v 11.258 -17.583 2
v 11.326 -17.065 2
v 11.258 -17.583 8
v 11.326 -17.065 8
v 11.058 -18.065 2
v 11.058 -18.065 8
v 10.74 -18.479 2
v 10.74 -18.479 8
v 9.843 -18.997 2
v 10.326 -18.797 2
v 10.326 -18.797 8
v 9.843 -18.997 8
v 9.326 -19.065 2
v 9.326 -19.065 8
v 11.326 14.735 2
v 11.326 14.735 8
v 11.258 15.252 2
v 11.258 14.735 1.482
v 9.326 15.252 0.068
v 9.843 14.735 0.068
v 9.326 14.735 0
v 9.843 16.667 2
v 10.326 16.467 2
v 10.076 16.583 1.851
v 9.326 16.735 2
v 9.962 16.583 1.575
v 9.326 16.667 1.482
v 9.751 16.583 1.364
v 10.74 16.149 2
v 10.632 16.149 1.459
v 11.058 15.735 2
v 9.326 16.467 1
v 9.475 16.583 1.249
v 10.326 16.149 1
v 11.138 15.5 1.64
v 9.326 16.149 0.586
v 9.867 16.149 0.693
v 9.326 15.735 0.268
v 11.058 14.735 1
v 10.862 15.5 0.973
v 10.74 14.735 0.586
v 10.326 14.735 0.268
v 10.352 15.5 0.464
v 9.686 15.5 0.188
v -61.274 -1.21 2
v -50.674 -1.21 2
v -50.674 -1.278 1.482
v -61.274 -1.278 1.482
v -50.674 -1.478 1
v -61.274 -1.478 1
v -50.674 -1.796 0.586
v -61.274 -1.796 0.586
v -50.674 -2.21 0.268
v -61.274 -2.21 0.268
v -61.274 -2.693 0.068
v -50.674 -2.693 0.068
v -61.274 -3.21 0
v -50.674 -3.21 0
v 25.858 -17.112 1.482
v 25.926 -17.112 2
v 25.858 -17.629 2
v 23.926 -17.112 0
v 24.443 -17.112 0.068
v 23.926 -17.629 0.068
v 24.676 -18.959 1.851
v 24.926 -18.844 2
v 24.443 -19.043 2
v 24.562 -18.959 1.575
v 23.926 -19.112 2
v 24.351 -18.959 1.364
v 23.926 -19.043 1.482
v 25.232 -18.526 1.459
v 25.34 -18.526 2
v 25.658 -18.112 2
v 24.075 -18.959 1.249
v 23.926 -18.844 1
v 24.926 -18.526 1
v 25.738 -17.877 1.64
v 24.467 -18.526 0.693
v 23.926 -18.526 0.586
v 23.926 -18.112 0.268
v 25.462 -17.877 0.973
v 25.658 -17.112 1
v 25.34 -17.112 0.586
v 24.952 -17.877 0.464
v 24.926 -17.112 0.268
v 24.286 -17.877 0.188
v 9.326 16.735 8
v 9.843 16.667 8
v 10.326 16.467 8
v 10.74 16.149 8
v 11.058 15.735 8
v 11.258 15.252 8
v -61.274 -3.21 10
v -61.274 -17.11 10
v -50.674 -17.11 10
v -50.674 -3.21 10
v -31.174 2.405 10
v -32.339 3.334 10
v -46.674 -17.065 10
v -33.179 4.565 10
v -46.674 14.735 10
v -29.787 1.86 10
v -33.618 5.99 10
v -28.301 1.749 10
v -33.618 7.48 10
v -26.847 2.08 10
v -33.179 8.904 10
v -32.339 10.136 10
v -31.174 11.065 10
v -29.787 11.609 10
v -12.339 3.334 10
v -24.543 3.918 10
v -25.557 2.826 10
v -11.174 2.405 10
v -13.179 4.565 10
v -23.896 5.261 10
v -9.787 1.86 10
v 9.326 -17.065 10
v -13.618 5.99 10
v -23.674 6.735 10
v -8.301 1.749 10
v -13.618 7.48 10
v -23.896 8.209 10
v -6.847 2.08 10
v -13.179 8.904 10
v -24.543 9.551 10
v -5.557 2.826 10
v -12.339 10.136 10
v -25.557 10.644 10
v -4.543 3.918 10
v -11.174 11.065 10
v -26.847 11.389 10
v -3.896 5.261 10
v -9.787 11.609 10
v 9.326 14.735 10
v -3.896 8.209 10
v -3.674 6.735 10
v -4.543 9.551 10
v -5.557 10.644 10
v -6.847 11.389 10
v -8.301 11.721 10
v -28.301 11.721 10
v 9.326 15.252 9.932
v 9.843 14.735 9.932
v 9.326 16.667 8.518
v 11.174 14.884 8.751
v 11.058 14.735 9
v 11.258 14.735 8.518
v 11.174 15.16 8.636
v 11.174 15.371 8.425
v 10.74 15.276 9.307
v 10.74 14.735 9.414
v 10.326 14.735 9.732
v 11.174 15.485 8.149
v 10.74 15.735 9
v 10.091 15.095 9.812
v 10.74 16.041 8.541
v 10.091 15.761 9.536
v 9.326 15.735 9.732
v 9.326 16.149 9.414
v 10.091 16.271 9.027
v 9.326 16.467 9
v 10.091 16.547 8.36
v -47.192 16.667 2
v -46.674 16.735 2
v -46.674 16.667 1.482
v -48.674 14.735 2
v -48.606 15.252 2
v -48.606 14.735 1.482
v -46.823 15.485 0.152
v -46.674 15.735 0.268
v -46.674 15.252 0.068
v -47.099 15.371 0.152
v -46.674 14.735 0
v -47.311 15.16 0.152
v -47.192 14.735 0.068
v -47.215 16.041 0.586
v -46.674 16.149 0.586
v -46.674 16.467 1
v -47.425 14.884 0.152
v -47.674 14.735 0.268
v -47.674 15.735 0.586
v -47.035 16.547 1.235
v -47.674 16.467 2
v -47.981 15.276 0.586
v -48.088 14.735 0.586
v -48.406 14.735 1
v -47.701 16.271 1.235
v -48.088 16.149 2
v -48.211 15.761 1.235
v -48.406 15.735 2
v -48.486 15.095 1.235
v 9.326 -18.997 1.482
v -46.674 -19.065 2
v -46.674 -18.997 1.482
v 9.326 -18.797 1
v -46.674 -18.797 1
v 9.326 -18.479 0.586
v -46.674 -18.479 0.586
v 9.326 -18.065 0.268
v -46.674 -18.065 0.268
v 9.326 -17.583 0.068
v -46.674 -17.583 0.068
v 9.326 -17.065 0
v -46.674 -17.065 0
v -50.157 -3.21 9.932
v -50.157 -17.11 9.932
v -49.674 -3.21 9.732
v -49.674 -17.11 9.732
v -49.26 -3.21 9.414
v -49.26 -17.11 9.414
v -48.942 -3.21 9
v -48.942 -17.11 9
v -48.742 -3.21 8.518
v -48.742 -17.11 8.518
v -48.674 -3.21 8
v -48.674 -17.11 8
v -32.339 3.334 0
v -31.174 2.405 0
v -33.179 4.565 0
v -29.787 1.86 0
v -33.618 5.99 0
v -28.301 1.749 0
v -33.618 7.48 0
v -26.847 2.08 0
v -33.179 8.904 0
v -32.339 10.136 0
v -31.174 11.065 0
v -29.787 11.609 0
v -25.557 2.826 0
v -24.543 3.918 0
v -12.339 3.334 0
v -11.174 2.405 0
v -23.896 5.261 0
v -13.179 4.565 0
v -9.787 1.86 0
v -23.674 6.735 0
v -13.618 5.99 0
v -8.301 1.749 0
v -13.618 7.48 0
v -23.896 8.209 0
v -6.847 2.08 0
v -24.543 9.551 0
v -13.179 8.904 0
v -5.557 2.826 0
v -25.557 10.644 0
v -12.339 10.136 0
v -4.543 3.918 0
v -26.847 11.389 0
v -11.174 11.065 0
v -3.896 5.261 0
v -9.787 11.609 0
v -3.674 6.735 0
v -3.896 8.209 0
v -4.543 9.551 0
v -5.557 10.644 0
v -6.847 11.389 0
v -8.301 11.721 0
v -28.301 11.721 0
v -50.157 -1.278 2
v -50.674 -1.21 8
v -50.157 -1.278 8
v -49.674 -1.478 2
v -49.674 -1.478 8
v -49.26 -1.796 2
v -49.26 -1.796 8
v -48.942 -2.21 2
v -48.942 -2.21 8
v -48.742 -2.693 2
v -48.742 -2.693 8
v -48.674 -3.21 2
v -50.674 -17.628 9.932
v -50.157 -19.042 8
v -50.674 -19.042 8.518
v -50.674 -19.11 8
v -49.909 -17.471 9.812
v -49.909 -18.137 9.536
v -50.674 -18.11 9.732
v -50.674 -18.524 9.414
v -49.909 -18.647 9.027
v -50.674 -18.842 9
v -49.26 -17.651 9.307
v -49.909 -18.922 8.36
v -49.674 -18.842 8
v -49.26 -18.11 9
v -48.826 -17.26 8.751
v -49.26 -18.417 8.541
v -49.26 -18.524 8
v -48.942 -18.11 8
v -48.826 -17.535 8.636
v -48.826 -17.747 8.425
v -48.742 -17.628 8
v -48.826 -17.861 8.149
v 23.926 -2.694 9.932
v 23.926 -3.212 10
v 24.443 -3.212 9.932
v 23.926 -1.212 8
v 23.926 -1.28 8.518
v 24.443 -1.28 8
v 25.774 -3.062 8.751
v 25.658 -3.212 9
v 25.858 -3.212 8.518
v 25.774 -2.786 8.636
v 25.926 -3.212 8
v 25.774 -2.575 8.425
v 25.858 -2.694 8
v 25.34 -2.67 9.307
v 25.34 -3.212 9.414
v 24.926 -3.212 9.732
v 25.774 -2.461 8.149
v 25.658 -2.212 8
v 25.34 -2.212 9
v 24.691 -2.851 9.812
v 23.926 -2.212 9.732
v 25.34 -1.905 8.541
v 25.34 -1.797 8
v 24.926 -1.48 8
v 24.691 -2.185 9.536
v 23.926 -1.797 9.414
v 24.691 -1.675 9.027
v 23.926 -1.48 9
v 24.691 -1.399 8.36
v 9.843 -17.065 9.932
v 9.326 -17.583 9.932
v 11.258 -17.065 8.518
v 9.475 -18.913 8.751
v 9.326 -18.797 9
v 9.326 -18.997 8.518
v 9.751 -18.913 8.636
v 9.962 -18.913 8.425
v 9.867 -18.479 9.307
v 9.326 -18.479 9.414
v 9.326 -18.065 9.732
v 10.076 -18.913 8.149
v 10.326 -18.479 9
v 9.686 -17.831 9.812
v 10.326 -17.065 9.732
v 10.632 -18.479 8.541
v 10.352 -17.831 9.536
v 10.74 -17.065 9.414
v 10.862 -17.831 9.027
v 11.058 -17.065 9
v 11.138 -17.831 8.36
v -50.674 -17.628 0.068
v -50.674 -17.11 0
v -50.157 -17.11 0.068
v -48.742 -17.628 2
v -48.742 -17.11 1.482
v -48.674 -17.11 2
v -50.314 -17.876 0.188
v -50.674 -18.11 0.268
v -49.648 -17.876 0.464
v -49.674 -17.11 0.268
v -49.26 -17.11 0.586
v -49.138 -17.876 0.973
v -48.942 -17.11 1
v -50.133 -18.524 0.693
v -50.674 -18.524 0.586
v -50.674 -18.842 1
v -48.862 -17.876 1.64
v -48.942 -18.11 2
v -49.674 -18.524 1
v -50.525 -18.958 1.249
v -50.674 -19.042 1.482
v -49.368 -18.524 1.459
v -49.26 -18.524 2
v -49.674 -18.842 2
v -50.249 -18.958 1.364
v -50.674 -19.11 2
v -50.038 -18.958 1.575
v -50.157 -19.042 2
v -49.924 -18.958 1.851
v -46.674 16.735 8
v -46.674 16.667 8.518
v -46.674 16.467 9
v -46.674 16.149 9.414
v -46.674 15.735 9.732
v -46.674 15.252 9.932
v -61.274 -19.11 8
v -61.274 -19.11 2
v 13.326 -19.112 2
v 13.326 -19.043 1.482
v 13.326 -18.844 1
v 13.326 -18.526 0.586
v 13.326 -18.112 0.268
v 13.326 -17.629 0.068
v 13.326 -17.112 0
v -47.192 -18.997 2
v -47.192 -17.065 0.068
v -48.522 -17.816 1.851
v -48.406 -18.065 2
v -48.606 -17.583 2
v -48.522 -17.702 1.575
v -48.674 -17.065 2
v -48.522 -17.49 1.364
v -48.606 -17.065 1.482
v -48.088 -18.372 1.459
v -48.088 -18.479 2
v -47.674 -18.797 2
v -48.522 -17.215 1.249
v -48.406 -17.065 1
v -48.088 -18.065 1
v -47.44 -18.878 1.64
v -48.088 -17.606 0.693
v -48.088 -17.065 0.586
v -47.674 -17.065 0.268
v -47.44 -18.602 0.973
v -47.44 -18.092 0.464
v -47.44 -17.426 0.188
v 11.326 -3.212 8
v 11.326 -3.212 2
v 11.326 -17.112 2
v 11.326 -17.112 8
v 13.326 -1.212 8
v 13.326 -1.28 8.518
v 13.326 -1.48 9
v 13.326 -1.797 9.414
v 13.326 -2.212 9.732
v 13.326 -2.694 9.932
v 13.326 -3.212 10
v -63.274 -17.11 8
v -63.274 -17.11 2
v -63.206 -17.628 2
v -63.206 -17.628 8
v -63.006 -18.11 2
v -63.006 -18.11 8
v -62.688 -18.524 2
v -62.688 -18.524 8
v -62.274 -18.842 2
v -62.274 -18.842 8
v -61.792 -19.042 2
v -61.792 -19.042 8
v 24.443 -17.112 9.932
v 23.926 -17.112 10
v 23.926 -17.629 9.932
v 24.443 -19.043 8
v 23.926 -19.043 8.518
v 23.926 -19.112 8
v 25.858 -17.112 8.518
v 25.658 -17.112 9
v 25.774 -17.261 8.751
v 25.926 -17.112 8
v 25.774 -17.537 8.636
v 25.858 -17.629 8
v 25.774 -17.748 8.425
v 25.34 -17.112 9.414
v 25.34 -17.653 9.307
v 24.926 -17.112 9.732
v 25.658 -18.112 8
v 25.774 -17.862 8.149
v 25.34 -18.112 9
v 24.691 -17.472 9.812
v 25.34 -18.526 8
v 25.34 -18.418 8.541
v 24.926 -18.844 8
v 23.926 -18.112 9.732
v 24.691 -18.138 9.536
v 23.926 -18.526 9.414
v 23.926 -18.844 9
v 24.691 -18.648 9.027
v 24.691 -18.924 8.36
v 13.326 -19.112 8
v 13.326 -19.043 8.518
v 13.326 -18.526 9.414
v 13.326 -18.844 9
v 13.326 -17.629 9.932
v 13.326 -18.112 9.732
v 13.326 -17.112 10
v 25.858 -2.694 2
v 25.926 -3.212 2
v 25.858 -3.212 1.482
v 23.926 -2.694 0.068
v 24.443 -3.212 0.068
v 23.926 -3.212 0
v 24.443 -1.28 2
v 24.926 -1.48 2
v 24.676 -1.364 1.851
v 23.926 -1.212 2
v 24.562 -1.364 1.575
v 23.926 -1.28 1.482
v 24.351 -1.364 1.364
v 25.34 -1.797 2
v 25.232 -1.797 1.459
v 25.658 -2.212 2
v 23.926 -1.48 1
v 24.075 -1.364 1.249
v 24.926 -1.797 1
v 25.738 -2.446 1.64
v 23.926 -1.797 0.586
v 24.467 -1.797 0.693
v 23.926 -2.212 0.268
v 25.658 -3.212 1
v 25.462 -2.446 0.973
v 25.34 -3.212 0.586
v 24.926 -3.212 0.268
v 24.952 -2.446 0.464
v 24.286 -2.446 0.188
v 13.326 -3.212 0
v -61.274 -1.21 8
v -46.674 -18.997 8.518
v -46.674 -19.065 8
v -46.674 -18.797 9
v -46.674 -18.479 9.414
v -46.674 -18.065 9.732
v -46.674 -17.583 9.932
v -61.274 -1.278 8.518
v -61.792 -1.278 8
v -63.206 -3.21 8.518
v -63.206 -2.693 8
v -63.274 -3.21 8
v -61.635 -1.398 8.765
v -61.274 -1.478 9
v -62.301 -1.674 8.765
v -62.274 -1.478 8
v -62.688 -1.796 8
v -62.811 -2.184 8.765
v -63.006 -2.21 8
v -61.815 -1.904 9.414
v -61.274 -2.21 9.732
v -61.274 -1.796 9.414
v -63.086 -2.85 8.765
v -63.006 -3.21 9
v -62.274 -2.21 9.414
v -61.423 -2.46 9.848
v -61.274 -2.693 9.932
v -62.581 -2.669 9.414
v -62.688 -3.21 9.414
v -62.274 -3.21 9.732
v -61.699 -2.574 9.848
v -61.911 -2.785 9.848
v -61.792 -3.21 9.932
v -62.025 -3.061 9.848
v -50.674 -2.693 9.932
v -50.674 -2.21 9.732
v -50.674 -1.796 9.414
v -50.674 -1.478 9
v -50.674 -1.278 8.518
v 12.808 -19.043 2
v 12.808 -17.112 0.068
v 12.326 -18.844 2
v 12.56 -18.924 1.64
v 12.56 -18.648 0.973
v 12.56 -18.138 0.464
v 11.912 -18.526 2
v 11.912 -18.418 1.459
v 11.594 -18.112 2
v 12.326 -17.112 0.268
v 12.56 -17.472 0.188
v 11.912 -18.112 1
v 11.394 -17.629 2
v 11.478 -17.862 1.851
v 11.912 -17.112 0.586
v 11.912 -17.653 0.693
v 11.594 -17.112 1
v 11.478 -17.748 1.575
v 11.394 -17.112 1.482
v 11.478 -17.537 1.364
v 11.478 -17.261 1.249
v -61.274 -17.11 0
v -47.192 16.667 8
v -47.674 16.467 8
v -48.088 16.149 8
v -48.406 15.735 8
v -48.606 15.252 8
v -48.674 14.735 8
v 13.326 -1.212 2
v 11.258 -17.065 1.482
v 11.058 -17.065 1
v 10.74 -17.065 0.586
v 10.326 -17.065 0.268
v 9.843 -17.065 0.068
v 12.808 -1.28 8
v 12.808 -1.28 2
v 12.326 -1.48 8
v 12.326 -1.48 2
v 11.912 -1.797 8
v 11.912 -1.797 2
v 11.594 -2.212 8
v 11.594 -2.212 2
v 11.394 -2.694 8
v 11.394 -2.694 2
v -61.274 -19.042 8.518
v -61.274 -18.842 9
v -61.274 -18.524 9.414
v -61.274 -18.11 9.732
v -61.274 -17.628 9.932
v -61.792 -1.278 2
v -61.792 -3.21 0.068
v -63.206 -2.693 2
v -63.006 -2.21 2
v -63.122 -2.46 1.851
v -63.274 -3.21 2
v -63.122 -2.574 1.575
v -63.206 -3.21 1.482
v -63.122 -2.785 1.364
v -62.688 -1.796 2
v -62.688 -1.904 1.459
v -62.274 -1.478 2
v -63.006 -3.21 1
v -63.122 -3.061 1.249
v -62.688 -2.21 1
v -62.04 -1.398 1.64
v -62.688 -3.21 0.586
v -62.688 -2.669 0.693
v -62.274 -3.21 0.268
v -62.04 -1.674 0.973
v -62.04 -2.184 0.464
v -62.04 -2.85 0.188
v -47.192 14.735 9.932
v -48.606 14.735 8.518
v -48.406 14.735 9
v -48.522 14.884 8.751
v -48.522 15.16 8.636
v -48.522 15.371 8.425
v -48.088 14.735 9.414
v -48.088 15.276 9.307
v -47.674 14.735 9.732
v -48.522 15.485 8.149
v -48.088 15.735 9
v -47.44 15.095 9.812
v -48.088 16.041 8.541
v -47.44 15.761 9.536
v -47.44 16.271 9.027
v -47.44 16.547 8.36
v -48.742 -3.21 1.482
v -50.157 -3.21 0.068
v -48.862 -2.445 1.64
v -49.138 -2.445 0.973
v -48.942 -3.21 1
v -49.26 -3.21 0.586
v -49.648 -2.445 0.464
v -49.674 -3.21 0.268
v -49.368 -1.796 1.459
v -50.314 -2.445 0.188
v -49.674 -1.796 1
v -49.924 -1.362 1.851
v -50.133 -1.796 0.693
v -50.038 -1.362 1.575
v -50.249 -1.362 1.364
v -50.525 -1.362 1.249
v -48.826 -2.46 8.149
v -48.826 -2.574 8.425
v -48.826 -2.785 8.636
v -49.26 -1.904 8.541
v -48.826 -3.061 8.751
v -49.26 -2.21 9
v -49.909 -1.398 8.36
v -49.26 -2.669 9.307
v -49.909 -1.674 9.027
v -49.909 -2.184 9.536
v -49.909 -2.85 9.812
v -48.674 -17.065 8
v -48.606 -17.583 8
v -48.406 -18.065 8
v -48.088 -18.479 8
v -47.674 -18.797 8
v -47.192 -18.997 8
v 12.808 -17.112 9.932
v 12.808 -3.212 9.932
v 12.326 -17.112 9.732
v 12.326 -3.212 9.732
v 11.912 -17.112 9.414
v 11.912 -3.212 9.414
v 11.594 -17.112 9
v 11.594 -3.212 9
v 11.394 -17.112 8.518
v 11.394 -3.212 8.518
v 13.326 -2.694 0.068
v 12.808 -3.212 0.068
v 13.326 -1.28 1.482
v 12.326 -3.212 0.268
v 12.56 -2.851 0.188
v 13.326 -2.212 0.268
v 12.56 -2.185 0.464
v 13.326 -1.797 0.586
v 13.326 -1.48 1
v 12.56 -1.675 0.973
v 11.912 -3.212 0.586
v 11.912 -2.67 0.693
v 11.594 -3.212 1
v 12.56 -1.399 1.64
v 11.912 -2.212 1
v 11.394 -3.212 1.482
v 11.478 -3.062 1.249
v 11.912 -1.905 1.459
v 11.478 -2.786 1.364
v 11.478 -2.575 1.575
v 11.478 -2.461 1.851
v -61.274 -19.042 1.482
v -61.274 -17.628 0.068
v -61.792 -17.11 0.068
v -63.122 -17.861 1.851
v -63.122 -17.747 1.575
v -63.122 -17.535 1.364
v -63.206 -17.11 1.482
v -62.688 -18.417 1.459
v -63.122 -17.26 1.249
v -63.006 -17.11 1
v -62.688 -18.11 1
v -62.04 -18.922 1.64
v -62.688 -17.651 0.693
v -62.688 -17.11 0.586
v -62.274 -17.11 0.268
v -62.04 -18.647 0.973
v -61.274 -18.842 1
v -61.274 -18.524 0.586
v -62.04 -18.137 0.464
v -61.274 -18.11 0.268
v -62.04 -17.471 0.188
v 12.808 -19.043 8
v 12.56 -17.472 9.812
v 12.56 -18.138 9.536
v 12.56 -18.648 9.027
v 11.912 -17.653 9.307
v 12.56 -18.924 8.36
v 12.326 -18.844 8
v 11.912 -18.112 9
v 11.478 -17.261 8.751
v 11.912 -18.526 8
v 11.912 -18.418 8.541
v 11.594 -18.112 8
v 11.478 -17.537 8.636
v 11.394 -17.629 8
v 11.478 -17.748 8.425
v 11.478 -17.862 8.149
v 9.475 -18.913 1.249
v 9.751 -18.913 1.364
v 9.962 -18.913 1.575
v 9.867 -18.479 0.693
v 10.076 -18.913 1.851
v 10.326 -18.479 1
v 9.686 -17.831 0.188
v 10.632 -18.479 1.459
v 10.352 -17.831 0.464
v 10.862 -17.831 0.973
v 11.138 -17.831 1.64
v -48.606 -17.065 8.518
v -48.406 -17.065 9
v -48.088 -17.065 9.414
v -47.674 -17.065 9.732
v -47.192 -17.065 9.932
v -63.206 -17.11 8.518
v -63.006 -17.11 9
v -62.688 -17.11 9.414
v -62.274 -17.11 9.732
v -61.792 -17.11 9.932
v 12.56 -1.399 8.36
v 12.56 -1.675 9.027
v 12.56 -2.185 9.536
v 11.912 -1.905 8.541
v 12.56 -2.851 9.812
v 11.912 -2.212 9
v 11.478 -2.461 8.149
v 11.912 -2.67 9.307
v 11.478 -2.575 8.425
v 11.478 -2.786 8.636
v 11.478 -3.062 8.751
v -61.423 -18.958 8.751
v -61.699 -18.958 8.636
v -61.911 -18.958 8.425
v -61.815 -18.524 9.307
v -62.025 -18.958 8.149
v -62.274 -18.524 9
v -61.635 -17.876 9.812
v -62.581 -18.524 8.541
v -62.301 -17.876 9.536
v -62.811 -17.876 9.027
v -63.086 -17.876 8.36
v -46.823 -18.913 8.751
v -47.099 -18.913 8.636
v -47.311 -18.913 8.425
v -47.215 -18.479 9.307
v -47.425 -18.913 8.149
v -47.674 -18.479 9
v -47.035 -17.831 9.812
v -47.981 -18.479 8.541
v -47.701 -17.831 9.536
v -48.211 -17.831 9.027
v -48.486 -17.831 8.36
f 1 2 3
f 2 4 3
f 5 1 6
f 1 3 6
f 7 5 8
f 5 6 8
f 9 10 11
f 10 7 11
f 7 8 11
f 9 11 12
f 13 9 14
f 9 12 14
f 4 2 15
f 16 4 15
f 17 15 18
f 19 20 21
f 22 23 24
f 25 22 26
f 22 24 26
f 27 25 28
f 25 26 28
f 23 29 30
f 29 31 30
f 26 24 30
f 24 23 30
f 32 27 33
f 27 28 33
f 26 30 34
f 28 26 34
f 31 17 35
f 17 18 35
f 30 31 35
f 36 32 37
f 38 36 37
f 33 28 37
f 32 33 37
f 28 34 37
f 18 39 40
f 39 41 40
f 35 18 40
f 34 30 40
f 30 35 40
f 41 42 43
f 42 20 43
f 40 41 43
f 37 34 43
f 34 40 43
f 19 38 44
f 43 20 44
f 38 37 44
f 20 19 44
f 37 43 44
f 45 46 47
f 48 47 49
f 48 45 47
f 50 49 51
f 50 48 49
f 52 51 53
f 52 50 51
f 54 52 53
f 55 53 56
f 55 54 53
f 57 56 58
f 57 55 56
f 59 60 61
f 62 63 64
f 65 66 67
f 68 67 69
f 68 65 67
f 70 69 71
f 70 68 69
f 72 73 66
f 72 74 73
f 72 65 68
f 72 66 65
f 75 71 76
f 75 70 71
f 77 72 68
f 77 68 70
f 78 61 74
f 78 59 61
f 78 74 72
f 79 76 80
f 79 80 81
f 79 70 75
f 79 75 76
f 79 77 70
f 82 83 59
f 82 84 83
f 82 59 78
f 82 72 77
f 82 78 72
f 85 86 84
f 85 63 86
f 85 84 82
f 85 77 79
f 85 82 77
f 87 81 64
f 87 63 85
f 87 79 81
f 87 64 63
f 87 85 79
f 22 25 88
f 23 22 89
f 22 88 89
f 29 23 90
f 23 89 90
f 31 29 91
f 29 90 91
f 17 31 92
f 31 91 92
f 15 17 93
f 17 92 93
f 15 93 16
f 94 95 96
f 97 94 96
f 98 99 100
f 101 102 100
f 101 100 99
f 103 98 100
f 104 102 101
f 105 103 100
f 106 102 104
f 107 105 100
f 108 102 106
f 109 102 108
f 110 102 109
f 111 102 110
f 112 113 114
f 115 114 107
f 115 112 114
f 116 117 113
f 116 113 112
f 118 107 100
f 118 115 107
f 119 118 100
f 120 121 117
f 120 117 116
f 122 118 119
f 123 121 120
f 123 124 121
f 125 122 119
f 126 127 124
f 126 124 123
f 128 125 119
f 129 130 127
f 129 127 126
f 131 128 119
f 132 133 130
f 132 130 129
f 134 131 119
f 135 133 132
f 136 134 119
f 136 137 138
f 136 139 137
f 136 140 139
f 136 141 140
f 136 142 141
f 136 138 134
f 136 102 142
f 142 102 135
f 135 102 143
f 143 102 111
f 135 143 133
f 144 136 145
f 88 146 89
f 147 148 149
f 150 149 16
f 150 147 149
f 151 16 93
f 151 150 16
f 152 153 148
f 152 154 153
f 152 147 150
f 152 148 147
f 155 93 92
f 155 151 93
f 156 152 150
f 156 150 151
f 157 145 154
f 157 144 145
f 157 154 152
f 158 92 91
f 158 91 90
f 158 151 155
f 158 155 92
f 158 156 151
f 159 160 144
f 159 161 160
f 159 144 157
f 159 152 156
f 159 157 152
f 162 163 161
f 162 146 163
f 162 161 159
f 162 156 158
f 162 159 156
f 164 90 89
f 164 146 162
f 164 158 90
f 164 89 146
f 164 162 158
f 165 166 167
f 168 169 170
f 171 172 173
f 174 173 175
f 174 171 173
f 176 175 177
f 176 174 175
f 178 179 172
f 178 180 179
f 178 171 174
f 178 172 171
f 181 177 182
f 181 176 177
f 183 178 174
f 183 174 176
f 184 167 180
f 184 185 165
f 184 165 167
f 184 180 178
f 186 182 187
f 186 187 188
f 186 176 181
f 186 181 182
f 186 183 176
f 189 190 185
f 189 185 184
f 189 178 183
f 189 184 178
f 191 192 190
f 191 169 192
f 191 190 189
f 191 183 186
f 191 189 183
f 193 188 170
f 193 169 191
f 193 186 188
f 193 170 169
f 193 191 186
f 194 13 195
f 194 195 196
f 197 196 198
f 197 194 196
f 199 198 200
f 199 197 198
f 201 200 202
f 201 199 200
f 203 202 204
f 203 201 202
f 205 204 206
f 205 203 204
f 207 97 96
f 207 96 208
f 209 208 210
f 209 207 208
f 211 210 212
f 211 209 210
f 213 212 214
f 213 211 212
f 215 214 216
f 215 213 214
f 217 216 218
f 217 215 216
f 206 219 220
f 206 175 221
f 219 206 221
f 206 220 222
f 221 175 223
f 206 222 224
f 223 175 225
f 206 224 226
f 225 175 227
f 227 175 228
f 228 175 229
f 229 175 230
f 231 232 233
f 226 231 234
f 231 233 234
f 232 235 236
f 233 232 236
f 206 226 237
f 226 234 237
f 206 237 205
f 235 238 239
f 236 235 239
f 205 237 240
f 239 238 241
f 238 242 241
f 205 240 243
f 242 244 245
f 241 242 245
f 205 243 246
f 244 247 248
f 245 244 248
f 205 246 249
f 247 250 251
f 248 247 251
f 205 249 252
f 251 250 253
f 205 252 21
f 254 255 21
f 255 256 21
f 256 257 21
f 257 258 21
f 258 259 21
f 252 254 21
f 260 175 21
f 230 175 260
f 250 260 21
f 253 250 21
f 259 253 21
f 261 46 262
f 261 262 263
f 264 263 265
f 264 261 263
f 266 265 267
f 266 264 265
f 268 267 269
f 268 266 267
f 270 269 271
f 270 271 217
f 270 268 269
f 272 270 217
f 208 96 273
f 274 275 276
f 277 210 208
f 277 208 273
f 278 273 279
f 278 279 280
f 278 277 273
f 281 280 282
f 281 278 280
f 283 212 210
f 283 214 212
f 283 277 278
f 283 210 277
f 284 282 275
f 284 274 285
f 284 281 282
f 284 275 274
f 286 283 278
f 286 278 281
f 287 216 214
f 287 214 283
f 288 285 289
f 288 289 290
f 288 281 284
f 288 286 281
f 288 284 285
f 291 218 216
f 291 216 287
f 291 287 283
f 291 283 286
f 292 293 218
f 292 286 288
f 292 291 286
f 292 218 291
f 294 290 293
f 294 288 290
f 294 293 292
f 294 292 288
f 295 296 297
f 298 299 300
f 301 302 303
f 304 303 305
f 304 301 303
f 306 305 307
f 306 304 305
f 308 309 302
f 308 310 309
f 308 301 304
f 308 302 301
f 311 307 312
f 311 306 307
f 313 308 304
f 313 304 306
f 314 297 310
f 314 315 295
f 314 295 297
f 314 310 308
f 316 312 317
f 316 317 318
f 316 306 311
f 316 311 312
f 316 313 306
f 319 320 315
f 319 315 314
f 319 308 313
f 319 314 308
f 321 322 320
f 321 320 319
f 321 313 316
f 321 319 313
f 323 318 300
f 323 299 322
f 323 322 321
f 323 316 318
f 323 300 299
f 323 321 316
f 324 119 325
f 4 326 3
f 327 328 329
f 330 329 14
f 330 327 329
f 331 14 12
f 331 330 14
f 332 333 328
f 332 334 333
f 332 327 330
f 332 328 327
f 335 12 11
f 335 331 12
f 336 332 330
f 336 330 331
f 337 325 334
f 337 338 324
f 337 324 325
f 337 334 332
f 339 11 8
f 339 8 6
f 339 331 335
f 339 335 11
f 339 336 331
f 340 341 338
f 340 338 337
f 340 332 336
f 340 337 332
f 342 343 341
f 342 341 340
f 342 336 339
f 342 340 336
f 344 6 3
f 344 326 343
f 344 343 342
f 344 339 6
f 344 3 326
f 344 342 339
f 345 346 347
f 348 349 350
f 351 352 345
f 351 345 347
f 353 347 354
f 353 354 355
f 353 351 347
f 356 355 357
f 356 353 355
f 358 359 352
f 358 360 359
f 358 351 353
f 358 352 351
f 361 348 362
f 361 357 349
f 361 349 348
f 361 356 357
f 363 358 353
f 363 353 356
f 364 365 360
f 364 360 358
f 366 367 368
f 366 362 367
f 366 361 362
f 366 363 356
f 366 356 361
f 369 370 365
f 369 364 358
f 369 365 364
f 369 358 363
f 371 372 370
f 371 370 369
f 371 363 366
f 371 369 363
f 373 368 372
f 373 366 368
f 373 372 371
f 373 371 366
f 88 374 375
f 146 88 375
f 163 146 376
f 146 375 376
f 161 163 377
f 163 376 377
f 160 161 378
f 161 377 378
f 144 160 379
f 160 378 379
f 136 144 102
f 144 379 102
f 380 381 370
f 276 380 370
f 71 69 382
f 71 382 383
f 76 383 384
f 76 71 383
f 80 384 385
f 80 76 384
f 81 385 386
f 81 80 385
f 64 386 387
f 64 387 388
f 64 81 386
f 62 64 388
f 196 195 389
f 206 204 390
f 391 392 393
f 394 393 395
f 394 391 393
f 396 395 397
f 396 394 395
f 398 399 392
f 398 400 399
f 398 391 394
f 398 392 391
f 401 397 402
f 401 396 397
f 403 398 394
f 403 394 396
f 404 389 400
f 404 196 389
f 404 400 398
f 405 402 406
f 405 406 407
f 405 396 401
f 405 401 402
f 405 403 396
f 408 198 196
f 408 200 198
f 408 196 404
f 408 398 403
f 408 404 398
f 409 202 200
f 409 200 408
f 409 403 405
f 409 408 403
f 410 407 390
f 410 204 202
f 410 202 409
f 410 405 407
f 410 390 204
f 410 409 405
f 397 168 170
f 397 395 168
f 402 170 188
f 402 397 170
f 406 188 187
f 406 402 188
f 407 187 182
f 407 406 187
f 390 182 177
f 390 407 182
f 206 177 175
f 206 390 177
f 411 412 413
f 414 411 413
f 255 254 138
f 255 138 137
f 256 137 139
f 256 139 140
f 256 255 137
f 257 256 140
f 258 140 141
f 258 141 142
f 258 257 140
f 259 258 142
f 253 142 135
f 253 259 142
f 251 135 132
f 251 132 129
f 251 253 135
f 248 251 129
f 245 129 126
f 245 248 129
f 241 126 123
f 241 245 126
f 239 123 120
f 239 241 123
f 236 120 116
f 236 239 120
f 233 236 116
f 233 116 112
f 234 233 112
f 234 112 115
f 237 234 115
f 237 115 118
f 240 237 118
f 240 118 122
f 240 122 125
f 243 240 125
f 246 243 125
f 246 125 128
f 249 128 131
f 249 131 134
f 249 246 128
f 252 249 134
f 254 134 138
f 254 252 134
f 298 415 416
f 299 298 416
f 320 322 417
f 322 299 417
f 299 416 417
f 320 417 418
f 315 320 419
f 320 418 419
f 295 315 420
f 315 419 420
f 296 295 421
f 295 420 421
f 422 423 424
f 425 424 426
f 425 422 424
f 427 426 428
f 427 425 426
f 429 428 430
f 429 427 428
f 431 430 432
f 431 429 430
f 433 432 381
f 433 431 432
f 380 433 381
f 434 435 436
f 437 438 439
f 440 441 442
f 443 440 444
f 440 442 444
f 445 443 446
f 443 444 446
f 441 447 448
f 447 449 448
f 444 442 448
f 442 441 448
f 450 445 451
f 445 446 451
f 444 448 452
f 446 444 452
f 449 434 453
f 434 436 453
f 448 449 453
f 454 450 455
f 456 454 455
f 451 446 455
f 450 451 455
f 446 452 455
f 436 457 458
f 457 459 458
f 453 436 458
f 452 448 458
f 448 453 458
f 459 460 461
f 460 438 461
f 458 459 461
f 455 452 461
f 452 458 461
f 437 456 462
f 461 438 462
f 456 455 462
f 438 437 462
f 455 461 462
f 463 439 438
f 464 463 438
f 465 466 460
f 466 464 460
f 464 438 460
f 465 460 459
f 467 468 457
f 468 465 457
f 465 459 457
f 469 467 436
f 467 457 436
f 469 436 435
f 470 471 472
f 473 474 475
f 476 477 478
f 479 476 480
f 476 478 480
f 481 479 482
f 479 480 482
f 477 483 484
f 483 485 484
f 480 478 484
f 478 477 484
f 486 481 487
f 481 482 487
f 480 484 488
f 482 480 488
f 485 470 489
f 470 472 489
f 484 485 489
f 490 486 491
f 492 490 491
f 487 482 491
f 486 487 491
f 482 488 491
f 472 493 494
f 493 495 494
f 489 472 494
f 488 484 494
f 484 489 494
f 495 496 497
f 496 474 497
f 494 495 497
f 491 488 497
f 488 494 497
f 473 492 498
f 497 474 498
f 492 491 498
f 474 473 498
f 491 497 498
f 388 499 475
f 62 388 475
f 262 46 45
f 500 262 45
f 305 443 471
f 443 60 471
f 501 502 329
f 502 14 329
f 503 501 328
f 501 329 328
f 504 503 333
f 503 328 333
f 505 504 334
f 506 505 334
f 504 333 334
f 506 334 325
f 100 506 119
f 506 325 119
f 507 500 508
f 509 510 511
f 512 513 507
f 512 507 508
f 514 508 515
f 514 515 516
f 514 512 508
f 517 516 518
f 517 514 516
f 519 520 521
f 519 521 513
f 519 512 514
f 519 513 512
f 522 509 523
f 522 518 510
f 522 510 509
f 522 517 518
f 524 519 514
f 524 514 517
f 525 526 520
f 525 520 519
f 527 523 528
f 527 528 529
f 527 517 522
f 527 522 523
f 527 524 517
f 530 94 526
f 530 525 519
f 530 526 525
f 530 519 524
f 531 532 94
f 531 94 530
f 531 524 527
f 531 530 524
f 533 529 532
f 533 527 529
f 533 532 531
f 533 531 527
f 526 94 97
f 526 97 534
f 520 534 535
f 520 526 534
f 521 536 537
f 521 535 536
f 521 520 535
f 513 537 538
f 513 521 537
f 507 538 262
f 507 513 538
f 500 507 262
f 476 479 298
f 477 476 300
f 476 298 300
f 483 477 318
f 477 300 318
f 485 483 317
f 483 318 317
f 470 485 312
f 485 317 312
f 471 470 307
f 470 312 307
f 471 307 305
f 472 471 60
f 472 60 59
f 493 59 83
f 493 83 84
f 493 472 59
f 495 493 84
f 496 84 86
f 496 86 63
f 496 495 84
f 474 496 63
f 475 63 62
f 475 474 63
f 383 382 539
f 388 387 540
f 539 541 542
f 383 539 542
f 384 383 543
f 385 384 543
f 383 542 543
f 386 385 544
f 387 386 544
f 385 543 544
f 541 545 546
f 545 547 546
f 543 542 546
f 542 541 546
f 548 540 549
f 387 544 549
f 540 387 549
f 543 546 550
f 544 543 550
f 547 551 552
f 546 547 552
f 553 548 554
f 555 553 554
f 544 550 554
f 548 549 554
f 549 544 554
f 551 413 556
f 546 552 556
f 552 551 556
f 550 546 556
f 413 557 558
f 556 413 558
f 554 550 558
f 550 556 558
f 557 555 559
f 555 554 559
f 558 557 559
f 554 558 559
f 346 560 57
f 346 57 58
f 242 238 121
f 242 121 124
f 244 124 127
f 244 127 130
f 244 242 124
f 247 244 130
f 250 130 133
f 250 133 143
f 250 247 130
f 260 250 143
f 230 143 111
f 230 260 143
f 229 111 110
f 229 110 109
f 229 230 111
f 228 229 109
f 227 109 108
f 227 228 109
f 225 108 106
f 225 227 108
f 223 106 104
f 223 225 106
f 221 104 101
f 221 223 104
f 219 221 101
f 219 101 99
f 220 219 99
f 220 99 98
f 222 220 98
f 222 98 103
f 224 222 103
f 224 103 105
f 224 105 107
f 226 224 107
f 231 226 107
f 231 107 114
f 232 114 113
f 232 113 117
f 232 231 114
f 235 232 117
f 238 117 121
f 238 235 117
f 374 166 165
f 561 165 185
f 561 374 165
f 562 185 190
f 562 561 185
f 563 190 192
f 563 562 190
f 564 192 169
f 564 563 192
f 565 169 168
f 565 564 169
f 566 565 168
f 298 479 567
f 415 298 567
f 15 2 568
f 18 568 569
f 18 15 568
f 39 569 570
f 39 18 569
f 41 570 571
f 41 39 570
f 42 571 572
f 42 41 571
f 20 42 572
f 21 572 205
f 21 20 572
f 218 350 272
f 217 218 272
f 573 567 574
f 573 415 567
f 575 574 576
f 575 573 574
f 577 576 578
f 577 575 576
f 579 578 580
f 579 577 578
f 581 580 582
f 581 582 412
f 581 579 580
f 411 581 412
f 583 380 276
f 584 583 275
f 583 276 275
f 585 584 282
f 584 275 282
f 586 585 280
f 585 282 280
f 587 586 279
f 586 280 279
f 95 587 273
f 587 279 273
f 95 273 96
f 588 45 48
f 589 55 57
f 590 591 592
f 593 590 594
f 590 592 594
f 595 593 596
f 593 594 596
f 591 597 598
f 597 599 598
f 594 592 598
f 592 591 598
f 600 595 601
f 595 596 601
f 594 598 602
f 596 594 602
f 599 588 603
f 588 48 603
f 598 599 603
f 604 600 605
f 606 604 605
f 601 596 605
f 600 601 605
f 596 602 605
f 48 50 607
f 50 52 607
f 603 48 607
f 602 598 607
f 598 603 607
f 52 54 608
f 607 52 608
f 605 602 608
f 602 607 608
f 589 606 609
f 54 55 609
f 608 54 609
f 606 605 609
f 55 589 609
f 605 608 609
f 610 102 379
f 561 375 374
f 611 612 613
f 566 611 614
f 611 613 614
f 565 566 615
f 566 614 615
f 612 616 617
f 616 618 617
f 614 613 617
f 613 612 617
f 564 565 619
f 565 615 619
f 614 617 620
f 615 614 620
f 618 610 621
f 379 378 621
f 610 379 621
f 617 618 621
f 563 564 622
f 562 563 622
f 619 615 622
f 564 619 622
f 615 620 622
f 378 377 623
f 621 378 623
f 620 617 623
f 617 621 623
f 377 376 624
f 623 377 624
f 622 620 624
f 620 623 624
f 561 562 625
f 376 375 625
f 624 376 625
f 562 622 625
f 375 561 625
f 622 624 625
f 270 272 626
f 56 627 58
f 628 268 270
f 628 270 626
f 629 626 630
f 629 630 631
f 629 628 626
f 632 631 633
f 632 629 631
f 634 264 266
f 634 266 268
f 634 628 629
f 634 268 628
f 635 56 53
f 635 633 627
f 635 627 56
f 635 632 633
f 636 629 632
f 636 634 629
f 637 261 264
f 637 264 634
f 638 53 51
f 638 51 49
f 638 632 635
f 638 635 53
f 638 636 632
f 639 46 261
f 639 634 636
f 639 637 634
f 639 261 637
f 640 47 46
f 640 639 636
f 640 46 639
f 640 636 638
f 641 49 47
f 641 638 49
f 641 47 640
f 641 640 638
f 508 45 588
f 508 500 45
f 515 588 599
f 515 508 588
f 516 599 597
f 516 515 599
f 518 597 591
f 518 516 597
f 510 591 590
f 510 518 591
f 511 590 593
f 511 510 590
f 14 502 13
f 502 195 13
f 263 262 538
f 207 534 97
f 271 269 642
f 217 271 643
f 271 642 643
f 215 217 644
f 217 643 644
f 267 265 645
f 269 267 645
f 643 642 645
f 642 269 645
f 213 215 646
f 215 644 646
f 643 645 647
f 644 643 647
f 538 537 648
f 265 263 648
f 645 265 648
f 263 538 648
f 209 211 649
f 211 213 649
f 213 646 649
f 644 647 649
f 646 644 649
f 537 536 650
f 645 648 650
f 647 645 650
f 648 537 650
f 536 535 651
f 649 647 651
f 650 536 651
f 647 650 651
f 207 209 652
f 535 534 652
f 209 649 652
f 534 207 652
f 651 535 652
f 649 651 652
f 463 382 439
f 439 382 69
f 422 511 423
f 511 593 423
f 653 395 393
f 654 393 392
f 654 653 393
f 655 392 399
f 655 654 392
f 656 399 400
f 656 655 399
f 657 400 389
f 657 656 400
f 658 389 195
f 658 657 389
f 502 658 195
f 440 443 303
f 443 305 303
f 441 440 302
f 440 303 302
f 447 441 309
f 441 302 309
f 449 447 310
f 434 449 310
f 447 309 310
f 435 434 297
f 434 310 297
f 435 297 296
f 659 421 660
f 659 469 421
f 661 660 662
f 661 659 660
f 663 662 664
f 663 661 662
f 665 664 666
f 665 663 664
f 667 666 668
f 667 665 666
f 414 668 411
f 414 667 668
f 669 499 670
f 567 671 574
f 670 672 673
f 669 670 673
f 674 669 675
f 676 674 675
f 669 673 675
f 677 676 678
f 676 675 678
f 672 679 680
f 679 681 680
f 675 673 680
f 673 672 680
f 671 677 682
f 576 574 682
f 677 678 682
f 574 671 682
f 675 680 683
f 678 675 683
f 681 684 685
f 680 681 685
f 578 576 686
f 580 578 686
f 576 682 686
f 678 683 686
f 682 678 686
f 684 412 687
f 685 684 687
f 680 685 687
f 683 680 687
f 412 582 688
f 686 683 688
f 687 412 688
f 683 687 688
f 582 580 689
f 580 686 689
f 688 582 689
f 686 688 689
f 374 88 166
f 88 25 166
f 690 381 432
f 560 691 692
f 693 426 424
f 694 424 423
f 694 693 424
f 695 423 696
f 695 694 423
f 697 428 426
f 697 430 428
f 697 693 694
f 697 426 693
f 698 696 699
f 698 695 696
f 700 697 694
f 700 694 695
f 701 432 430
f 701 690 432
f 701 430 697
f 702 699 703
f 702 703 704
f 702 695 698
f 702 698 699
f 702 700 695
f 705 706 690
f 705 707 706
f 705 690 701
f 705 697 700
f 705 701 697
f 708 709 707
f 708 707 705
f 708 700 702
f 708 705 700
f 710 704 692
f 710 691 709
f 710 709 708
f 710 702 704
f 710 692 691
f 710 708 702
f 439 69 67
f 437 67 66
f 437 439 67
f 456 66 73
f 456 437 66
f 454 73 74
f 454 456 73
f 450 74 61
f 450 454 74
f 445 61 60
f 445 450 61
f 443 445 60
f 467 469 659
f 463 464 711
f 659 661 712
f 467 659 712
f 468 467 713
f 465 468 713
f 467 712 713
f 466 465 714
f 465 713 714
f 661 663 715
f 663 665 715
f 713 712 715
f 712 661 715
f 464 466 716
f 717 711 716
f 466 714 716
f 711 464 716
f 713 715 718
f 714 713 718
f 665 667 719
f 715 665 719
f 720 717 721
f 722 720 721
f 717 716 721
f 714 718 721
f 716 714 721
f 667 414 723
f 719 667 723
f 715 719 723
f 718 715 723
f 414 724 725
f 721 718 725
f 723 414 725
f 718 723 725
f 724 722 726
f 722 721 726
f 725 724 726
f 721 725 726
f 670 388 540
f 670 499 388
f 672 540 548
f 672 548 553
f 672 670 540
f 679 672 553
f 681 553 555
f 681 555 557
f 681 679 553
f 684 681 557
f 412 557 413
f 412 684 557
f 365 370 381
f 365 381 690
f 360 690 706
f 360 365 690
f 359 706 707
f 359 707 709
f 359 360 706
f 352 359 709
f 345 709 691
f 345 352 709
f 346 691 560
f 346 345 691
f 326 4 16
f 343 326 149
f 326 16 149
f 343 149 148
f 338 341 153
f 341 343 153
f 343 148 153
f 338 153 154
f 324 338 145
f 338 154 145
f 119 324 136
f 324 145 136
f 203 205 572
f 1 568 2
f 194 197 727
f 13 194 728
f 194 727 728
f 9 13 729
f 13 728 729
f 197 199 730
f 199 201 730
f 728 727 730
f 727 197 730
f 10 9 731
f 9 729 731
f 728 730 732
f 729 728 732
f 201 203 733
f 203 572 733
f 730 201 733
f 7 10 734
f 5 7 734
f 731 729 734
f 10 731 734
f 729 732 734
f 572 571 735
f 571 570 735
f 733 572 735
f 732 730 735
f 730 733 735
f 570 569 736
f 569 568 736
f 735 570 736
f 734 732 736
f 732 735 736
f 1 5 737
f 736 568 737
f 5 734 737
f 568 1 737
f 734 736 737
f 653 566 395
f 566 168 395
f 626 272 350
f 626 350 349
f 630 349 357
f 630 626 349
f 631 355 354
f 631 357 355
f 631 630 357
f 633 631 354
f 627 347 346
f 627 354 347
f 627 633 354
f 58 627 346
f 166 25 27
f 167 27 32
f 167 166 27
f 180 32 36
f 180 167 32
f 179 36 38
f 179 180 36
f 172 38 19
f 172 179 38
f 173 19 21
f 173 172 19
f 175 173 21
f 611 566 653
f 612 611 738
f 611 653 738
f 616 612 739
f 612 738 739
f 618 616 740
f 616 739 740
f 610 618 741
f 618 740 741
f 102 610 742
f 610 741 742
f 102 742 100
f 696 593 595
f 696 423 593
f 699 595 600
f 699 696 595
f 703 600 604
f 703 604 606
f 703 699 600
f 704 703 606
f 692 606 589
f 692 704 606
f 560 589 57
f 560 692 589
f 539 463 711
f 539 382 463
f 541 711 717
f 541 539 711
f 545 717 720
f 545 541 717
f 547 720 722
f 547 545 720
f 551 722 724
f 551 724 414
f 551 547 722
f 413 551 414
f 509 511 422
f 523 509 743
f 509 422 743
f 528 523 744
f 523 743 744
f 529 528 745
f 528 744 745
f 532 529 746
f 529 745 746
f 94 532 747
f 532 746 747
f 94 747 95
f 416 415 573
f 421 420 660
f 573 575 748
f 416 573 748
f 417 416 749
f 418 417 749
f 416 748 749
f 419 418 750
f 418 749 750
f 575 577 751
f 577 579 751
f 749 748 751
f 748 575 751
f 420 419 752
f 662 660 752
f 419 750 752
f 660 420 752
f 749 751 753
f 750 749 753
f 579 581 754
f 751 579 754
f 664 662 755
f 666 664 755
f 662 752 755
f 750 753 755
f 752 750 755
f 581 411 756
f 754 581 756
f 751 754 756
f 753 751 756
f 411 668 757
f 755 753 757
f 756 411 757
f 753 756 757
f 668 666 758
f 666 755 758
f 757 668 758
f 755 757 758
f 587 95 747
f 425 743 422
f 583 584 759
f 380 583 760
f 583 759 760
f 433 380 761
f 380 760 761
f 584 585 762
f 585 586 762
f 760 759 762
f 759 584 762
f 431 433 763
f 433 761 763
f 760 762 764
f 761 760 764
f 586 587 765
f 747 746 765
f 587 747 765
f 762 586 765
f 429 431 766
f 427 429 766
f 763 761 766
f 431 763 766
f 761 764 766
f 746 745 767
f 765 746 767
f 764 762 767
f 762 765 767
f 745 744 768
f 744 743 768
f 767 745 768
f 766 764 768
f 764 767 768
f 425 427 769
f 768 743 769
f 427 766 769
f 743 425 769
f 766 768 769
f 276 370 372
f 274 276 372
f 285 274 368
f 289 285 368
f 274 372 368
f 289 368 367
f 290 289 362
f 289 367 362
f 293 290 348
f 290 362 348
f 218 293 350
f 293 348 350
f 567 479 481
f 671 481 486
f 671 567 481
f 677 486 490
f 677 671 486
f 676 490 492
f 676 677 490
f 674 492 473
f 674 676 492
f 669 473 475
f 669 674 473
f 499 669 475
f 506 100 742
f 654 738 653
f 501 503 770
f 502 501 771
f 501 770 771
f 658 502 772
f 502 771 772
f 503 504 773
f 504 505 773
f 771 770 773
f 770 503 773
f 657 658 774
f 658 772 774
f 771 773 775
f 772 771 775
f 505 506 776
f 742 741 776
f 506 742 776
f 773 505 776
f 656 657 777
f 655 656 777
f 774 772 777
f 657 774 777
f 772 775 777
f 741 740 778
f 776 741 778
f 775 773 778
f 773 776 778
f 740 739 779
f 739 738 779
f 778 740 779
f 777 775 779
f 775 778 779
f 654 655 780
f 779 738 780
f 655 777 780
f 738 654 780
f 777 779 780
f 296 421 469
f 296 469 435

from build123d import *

# Parameters (mm, degrees)
F1_DEPTH     = 10
F0_R         = 5
F2_DEPTH     = 10
F3_R         = 2
F3_2_R       = 2
F3_3_R       = 2
F4_T1_DEPTH  = 17.6
F4_S5_W      = 2.04
F4_S5_H      = 2.04
F4_T6_DEPTH  = 2.04
F4_T9_DEPTH  = 6
F4_T11_DEPTH = 13.9
F4_S15_W     = 2.04
F4_S15_H     = 2.04
F4_T16_DEPTH = 2.04
F4_S21_W     = 2.04
F4_S21_H     = 2.04
F4_T22_DEPTH = 2.04
F4_T26_ANGLE = 90
F4_T28_ANGLE = 90
F4_2_F1_R    = 2


# Not quite as in the source:
# - a fillet or chamfer that OpenCascade refuses, or shapes differently, is made with other operations: its cross-section is extruded or revolved along the edge and cut away or added
# - a feature of the source that left no trace in its solid (it failed there, or was rolled back) is left out


with BuildPart() as f1:
    # F0 (on Top) → F1 (new body)
    with BuildSketch(Plane.XY):
        Polygon((-48.6741693407, -19.0652475223), (-48.6741693407, -1.2101934761), (-63.2741693407, -1.2101934761), (-63.2741693407, -19.1101934761), (-48.6741693407, -19.1101934761), align=None)
    extrude(amount=F1_DEPTH)

    # F3
    f3_edges = [f1.edges().sort_by_distance(p)[0] for p in [
        (-63.274169, -10.160193, 10),
        (-55.974169, -19.110193, 10),
        (-55.974169, -1.210193, 0),
        (-48.674169, -10.160193, 0),
        (-55.974169, -19.110193, 0),
        (-63.274169, -19.110193, 5),
        (-63.274169, -1.210193, 5),
        (-63.274169, -10.160193, 0),
    ]]
    fillet(f3_edges, radius=F3_R)

    # F4: fillet of radius 2 on 2 edges, made by hand

    # F4_s2 → F4_t1 (cut)
    with BuildSketch(Plane.YZ.offset(-61.2741693407)):
        with BuildLine():
            ThreePointArc((-3.2101934761, 10), (-1.7959799137, 9.4142135624), (-1.2101934761, 8))
            Line((-1.2101934761, 8), (-1.1701934761, 8))
            Line((-1.1701934761, 8), (-1.1701934761, 10.04))
            Line((-1.1701934761, 10.04), (-3.2101934761, 10.04))
            Line((-3.2101934761, 10.04), (-3.2101934761, 10))
        make_face()
    extrude(amount=F4_T1_DEPTH, mode=Mode.SUBTRACT)


with BuildPart() as f1b:
    # F0 (on Top) → F1, piece 2 (new body)
    with BuildSketch(Plane.XY):
        Polygon((25.9258306593, -1.2115662456), (11.3258306593, -1.2115662456), (11.3258306593, -19.0652475223), (11.3258306593, -19.1115662456), (25.9258306593, -19.1115662456), align=None)
    extrude(amount=F1_DEPTH)

    # F3#2
    f3_2_edges = [f1b.edges().sort_by_distance(p)[0] for p in [
        (18.625831, -19.111566, 10),
        (18.625831, -1.211566, 10),
        (25.925831, -10.161566, 10),
        (25.925831, -10.161566, 0),
        (25.925831, -1.211566, 5),
        (18.625831, -1.211566, 0),
        (25.925831, -19.111566, 5),
        (18.625831, -19.111566, 0),
    ]]
    fillet(f3_2_edges, radius=F3_2_R)

    # F4#2: fillet of radius 2 on 2 edges, made by hand

    # F4_2_f1
    f4_2_f1_edges = [f1b.edges().sort_by_distance(p)[0] for p in [
        (11.3258306593, -1.2115662456, 5),
        (11.3258306593, -1.7973526832, 0.5857864376),
        (11.3258306593, -1.7973526832, 9.4142135624),
        (11.3258306593, -10.1615662456, 0),
        (11.3258306593, -10.1615662456, 10),
        (11.3258306593, -18.5257798079, 0.5857864376),
        (11.3258306593, -18.5257798079, 9.4142135624),
        (11.3258306593, -19.1115662456, 5),
    ]]
    fillet(f4_2_f1_edges, radius=F4_2_F1_R)


with BuildPart() as f2:
    # F0 (on Top) → F2 (new body)
    with BuildSketch(Plane.XY):
        Polygon((11.3258306593, 16.7347524777), (-48.6741693407, 16.7347524777), (-48.6741693407, -1.2101934761), (-48.6741693407, -19.0652475223), (11.3258306593, -19.0652475223), (11.3258306593, -1.2115662456), align=None)
        with Locations((-28.6741693407, 6.7347524777)):
            Circle(F0_R, mode=Mode.SUBTRACT)
        with Locations((-8.6741693407, 6.7347524777)):
            Circle(F0_R, mode=Mode.SUBTRACT)
    extrude(amount=F2_DEPTH)

    # F3#3
    f3_3_edges = [f2.edges().sort_by_distance(p)[0] for p in [
        (11.325831, -10.161566, 0),
        (-18.674169, 16.734752, 10),
        (11.325831, -1.165248, 10),
        (-48.674169, -1.165248, 10),
        (-18.674169, -19.065248, 10),
        (11.325831, 16.734752, 5),
        (-48.674169, 16.734752, 5),
        (-18.674169, -19.065248, 0),
        (-18.674169, 16.734752, 0),
        (-48.674169, -19.065248, 5),
        (-48.674169, -1.165248, 0),
        (11.325831, -19.065248, 5),
        (11.325831, -1.165248, 0),
    ]]
    fillet(f3_3_edges, radius=F3_3_R)


with BuildPart() as f4_tool4:
    # F4_s5 → F4_t6 (new body)
    with BuildSketch(Plane.XY.offset(8)):
        with Locations((-62.2941693407, -2.1901934761)):
            Rectangle(F4_S5_W, F4_S5_H)
    extrude(amount=F4_T6_DEPTH)

    # F4_s7 → F4_t8 (revolve, cut)
    with BuildSketch(Plane(origin=(-61.2741693407, -3.2101934761, 8), x_dir=(0.7071067812, -0.7071067812, 0), z_dir=(-0.7071067812, -0.7071067812, 0))):
        with BuildLine():
            ThreePointArc((0, -2), (2, 0), (0, 2))
            Line((0, 2), (0, -2))
        make_face()
    revolve(axis=Axis((-61.2741693407, -3.2101934761, 8), (0, 0, 1)), mode=Mode.SUBTRACT)


with BuildPart() as f1_1:
    add(f1.part)

    # F4_t3: cut F4_tool4
    add(f4_tool4.part, mode=Mode.SUBTRACT)

    # F4_s10 → F4_t9 (cut)
    with BuildSketch(Plane.XY.offset(2)):
        with BuildLine():
            ThreePointArc((-50.6741693407, -1.2101934761), (-49.2599557784, -1.7959799137), (-48.6741693407, -3.2101934761))
            Line((-48.6741693407, -3.2101934761), (-48.6341693407, -3.2101934761))
            Line((-48.6341693407, -3.2101934761), (-48.6341693407, -1.1701934761))
            Line((-48.6341693407, -1.1701934761), (-50.6741693407, -1.1701934761))
            Line((-50.6741693407, -1.1701934761), (-50.6741693407, -1.2101934761))
        make_face()
        with BuildLine():
            ThreePointArc((-50.6741693407, -19.1101934761), (-49.2599557784, -18.5244070385), (-48.6741693407, -17.1101934761))
            Line((-48.6741693407, -17.1101934761), (-48.6341693407, -17.1101934761))
            Line((-48.6341693407, -17.1101934761), (-48.6341693407, -19.1501934761))
            Line((-48.6341693407, -19.1501934761), (-50.6741693407, -19.1501934761))
            Line((-50.6741693407, -19.1501934761), (-50.6741693407, -19.1101934761))
        make_face()
    extrude(amount=F4_T9_DEPTH, mode=Mode.SUBTRACT)

    # F4_s12 → F4_t11 (cut)
    with BuildSketch(Plane.XZ.offset(3.2101934761)):
        with BuildLine():
            ThreePointArc((-50.6741693407, 10), (-49.2599557784, 9.4142135624), (-48.6741693407, 8))
            Line((-48.6741693407, 8), (-48.6341693407, 8))
            Line((-48.6341693407, 8), (-48.6341693407, 10.04))
            Line((-48.6341693407, 10.04), (-50.6741693407, 10.04))
            Line((-50.6741693407, 10.04), (-50.6741693407, 10))
        make_face()
    extrude(amount=F4_T11_DEPTH, mode=Mode.SUBTRACT)


with BuildPart() as f4_tool14:
    # F4_s15 → F4_t16 (new body)
    with BuildSketch(Plane.XZ.offset(3.2101934761)):
        with Locations((-49.6541693407, 0.98)):
            Rectangle(F4_S15_W, F4_S15_H)
    extrude(amount=-F4_T16_DEPTH)

    # F4_s17 → F4_t18 (revolve, cut)
    with BuildSketch(Plane(origin=(-50.6741693407, -3.2101934761, 2), x_dir=(-0.7071067812, 0, 0.7071067812), z_dir=(-0.7071067812, 0, -0.7071067812))):
        with BuildLine():
            ThreePointArc((0, -2), (2, 0), (0, 2))
            Line((0, 2), (0, -2))
        make_face()
    revolve(axis=Axis((-50.6741693407, -3.2101934761, 2), (0, 1, 0)), mode=Mode.SUBTRACT)


with BuildPart() as f1_2:
    add(f1_1.part)

    # F4_t13: cut F4_tool14
    add(f4_tool14.part, mode=Mode.SUBTRACT)


with BuildPart() as f4_tool20:
    # F4_s21 → F4_t22 (new body)
    with BuildSketch(Plane.XZ.offset(17.1101934761)):
        with Locations((-49.6541693407, 0.98)):
            Rectangle(F4_S21_W, F4_S21_H)
    extrude(amount=F4_T22_DEPTH)

    # F4_s23 → F4_t24 (revolve, cut)
    with BuildSketch(Plane(origin=(-50.6741693407, -17.1101934761, 2), x_dir=(-0.7071067812, 0, 0.7071067812), z_dir=(0.7071067812, 0, 0.7071067812))):
        with BuildLine():
            ThreePointArc((0, -2), (2, 0), (0, 2))
            Line((0, 2), (0, -2))
        make_face()
    revolve(axis=Axis((-50.6741693407, -17.1101934761, 2), (0, -1, 0)), mode=Mode.SUBTRACT)


with BuildPart() as f1_3:
    add(f1_2.part)

    # F4_t19: cut F4_tool20
    add(f4_tool20.part, mode=Mode.SUBTRACT)

    # F4_s25 → F4_t26 (revolve, cut)
    with BuildSketch(Plane.XY.offset(8)):
        with BuildLine():
            ThreePointArc((-48.6741693407, -3.2101934761), (-49.2599557784, -1.7959799137), (-50.6741693407, -1.2101934761))
            Line((-50.6741693407, -1.2101934761), (-50.6741693407, -1.1701934761))
            Line((-50.6741693407, -1.1701934761), (-48.6341693407, -1.1701934761))
            Line((-48.6341693407, -1.1701934761), (-48.6341693407, -3.2101934761))
            Line((-48.6341693407, -3.2101934761), (-48.6741693407, -3.2101934761))
        make_face()
    revolve(axis=Axis((-48.6741693407, -3.2101934761, 8), (1, 0, 0)), revolution_arc=F4_T26_ANGLE, mode=Mode.SUBTRACT)

    # F4_s27 → F4_t28 (revolve, cut)
    with BuildSketch(Plane.XZ.offset(17.1101934761)):
        with BuildLine():
            ThreePointArc((-50.6741693407, 10), (-49.2599557784, 9.4142135624), (-48.6741693407, 8))
            Line((-48.6741693407, 8), (-48.6341693407, 8))
            Line((-48.6341693407, 8), (-48.6341693407, 10.04))
            Line((-48.6341693407, 10.04), (-50.6741693407, 10.04))
            Line((-50.6741693407, 10.04), (-50.6741693407, 10))
        make_face()
    revolve(axis=Axis((-48.6741693407, -17.1101934761, 8), (1, 0, 0)), revolution_arc=F4_T28_ANGLE, mode=Mode.SUBTRACT)


solid = Compound([f1b.part, f2.part, f1_3.part])
